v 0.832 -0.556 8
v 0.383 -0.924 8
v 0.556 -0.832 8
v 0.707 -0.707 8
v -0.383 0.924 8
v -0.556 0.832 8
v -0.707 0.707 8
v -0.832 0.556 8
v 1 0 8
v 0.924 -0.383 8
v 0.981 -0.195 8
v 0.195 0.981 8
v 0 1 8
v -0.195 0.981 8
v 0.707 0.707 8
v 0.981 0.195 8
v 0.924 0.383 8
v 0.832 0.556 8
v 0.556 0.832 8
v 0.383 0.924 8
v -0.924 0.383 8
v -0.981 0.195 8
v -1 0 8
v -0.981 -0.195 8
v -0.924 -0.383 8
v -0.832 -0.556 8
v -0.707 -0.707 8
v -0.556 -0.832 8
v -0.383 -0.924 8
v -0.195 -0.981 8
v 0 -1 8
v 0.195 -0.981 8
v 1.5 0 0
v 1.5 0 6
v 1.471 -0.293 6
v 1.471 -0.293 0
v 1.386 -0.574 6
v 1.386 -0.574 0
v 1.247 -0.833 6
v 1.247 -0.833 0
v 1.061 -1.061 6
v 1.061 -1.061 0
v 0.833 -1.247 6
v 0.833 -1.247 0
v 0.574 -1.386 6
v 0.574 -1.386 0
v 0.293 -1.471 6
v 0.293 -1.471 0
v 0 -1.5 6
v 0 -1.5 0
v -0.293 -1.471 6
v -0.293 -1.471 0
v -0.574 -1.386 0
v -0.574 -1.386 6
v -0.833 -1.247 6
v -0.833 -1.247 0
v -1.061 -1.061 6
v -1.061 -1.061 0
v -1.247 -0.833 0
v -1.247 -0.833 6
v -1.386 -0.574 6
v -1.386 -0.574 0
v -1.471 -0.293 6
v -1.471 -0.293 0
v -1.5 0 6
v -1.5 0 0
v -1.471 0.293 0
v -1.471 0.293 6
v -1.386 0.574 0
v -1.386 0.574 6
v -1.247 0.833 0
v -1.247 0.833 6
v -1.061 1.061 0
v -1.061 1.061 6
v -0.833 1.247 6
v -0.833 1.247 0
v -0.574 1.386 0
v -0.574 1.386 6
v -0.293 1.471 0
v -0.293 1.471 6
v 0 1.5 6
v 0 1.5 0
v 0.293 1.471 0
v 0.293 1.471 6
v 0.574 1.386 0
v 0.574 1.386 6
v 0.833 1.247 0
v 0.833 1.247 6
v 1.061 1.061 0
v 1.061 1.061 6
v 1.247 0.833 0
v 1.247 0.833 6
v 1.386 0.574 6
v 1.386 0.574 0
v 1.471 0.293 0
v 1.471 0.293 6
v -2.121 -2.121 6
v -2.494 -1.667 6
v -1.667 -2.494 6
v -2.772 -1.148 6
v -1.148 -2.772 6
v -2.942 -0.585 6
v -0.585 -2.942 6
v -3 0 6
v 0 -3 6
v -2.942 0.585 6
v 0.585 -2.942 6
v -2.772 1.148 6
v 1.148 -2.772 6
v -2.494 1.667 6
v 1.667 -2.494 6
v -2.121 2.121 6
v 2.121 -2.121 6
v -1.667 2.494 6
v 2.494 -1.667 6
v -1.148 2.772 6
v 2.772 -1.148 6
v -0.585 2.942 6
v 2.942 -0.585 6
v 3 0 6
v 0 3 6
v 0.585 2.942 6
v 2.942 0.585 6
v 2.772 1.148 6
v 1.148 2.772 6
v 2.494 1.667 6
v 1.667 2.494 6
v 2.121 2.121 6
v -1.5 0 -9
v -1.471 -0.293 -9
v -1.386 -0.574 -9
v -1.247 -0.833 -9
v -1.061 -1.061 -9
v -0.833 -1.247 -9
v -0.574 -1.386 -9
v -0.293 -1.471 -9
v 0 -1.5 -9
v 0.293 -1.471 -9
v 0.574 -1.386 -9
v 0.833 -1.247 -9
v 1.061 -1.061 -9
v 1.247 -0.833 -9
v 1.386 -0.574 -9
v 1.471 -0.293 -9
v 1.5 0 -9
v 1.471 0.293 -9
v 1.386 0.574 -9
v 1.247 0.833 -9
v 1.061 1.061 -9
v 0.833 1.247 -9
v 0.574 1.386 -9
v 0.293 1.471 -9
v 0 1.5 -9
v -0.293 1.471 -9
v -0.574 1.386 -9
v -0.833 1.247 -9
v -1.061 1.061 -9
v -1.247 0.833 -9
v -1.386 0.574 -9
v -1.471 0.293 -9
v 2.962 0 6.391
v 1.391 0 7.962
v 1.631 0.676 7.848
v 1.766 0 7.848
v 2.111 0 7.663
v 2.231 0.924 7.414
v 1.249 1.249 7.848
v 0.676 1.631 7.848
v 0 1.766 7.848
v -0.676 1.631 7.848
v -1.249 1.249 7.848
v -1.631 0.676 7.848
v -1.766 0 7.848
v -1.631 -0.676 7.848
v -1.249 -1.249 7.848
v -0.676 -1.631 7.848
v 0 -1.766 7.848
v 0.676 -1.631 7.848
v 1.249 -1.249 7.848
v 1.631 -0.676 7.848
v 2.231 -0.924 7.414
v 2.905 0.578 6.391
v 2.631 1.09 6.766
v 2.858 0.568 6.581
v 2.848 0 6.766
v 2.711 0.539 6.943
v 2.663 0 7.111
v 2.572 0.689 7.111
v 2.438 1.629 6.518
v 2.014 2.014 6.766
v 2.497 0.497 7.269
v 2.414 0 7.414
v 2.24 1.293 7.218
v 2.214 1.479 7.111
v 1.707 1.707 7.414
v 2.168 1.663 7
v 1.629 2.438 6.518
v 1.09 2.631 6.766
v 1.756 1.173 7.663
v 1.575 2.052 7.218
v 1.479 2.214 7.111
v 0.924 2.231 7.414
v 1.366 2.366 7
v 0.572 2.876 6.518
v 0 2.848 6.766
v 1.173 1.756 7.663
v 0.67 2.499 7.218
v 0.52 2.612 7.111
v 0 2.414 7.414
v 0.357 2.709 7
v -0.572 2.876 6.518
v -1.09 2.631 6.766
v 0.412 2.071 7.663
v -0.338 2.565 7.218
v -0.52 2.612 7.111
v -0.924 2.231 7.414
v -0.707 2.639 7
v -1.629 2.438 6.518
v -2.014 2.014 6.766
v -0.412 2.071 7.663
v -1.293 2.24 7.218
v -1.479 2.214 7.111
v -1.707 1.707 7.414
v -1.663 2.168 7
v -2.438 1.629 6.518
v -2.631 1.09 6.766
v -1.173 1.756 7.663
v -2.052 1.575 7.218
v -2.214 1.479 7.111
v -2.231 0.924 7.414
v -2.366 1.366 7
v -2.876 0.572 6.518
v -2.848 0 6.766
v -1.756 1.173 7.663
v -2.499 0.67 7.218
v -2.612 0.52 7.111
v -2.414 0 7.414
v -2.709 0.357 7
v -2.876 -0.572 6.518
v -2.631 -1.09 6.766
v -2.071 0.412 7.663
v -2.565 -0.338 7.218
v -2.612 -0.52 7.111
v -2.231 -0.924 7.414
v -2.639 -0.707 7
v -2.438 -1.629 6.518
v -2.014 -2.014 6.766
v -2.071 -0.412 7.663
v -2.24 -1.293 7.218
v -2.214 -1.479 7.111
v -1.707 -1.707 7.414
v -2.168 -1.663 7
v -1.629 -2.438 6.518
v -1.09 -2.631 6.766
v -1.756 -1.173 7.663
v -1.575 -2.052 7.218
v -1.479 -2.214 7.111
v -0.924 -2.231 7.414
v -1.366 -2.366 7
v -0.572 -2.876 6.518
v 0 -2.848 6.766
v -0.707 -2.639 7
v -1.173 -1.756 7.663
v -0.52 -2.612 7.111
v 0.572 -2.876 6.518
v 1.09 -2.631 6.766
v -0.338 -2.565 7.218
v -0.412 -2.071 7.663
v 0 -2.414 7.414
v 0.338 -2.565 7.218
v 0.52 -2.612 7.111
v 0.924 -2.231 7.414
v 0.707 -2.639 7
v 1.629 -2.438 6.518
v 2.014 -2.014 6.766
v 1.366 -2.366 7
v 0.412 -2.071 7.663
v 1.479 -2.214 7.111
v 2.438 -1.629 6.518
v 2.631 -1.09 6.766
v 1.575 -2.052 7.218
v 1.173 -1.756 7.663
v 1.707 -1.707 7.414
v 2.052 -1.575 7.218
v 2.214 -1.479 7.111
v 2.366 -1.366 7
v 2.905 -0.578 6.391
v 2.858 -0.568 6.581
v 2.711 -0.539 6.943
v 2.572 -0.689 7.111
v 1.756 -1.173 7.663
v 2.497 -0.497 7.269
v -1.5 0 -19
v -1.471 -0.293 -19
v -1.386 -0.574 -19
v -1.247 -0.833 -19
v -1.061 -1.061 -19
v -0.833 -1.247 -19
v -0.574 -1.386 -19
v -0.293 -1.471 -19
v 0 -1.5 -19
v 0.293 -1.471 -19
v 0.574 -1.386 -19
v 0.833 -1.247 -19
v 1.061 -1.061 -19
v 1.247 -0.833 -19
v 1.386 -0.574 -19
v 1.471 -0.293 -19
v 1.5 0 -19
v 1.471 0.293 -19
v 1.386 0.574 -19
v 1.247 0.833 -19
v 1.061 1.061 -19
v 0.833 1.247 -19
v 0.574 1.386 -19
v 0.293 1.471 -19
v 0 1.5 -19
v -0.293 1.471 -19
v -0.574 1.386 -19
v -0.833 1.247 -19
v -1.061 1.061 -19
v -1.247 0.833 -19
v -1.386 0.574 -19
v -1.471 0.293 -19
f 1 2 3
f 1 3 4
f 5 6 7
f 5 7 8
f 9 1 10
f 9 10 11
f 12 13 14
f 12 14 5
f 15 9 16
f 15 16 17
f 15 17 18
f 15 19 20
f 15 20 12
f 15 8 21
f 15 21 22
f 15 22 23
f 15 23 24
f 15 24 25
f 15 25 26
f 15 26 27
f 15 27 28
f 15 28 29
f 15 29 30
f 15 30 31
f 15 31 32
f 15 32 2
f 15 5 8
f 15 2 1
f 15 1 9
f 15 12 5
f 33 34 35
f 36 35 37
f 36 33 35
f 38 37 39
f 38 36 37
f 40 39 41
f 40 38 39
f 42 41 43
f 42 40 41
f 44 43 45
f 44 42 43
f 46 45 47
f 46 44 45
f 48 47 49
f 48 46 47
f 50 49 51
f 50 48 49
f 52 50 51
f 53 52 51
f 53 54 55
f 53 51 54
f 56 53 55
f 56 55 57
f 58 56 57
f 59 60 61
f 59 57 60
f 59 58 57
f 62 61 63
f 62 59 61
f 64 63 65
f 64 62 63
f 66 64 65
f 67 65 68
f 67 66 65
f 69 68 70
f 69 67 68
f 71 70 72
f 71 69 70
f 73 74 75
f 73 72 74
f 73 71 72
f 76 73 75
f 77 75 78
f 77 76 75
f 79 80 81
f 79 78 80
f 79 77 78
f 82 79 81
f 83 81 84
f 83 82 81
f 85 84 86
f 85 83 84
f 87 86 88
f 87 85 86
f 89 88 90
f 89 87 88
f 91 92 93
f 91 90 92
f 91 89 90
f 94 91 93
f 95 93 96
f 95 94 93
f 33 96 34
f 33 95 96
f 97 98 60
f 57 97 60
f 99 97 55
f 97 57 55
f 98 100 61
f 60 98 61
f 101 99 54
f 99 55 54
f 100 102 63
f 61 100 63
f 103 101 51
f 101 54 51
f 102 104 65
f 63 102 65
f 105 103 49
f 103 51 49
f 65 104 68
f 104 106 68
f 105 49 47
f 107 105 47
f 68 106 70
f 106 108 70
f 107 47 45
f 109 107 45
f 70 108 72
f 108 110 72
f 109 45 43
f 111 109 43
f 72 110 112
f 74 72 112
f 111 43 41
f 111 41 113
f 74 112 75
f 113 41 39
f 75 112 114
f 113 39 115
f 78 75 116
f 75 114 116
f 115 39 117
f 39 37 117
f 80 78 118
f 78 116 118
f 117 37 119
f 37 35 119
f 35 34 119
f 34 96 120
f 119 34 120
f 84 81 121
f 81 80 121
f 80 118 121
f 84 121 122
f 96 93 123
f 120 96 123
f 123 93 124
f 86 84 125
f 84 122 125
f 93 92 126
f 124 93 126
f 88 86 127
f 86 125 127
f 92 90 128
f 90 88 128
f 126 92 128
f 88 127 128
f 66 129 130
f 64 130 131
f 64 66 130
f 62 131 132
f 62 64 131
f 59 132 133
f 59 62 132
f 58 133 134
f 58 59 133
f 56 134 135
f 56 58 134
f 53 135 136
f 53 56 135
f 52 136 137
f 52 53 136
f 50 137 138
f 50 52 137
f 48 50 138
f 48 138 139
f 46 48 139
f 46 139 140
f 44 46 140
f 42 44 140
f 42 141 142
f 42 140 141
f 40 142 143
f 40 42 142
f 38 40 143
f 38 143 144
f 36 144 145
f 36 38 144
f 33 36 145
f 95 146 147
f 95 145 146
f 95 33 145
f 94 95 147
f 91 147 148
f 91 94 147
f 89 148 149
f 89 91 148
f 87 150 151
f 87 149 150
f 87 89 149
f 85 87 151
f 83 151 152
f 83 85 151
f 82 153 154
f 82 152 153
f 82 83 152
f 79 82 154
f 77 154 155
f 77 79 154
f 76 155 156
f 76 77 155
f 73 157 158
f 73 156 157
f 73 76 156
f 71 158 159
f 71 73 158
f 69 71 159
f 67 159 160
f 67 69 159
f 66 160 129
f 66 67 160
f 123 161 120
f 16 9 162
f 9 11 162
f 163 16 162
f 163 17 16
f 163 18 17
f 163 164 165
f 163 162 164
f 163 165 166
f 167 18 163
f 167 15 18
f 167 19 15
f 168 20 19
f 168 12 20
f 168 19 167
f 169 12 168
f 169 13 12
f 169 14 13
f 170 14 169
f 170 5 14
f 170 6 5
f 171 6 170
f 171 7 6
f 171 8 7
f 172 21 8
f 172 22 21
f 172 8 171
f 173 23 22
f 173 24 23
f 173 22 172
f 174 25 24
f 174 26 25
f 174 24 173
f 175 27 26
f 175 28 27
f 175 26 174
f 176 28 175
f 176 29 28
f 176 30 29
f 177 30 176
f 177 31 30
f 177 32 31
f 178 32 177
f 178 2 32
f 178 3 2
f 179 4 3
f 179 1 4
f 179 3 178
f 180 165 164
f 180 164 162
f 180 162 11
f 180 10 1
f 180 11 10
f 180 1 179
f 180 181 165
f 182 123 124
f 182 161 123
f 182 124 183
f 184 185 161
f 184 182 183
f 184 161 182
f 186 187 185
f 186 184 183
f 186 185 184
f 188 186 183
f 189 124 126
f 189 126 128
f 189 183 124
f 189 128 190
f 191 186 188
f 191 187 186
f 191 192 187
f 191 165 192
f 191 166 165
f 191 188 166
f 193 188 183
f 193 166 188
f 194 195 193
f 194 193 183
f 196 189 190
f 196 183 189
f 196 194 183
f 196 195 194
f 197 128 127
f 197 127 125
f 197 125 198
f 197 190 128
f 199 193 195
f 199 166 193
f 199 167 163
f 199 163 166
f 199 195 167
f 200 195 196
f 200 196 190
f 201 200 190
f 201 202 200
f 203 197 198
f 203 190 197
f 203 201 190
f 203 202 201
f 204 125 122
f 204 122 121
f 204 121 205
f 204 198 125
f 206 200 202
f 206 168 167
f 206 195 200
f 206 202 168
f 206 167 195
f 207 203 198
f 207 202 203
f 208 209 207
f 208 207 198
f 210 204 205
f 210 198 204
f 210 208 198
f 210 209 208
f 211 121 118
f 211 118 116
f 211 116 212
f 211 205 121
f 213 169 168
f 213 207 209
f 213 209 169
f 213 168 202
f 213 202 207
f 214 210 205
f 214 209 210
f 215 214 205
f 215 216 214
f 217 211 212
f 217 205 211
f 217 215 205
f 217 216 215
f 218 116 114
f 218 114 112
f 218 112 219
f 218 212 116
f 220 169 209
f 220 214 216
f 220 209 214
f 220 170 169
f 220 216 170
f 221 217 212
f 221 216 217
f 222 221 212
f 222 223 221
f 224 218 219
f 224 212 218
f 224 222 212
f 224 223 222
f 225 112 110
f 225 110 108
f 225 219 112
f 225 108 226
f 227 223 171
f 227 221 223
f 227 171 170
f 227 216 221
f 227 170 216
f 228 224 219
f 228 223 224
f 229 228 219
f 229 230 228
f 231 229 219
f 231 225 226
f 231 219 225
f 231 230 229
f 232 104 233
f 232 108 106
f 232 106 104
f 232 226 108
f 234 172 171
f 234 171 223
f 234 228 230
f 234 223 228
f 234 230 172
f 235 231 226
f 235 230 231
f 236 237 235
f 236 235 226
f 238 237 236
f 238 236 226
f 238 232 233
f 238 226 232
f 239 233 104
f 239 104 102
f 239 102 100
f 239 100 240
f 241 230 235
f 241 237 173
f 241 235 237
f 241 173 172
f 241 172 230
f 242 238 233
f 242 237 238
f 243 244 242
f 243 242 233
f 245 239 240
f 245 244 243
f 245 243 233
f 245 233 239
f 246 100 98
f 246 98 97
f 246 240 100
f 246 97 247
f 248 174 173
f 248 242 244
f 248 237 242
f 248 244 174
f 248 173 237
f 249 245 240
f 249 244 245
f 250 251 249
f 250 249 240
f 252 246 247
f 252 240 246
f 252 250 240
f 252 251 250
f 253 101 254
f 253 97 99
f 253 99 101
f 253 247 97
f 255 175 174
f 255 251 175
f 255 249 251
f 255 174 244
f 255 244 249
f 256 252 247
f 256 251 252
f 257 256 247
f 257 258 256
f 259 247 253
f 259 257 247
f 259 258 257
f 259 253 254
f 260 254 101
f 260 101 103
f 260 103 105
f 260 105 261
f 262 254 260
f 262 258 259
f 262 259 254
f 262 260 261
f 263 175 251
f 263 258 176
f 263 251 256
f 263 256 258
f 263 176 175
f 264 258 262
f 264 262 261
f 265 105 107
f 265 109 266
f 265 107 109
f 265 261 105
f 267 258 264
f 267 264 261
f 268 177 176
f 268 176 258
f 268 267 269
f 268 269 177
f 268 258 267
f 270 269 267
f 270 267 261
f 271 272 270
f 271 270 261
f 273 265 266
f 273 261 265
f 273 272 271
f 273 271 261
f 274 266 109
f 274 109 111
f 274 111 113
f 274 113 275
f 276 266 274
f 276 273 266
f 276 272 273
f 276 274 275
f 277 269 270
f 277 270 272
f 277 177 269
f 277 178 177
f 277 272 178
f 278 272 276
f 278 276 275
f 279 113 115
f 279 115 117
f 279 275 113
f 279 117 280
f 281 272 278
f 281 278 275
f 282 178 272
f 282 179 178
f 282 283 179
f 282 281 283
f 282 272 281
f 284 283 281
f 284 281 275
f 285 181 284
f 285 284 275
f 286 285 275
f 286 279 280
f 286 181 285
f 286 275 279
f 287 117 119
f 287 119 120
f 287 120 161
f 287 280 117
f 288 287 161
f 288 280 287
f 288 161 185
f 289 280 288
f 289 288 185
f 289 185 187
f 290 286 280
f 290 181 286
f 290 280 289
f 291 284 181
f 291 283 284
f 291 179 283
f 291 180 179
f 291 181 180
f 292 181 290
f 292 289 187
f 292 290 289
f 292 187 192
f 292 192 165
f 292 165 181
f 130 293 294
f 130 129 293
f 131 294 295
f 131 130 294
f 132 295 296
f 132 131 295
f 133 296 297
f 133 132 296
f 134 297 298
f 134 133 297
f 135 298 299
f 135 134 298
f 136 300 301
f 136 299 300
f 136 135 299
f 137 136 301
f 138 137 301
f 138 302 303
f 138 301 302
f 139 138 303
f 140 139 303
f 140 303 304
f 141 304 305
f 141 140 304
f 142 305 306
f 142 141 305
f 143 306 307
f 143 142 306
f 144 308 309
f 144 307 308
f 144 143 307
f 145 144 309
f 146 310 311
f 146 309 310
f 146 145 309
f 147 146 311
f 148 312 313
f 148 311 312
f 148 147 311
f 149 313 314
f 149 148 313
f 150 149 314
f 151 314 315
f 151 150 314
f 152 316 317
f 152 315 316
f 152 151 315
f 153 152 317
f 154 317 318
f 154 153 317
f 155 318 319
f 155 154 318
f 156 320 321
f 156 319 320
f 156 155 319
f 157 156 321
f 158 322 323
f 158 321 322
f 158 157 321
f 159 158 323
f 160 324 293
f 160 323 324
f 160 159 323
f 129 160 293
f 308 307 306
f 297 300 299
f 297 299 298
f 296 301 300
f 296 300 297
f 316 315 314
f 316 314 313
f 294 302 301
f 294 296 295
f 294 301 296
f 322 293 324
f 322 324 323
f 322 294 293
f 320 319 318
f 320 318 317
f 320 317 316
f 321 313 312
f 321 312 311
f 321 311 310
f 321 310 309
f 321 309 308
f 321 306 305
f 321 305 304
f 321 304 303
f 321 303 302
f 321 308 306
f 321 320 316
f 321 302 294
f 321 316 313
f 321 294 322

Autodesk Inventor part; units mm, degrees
ref_plane "YZ Plane" through (0, 0, 0) normal (1, 0, 0) x (0, 1, 0)
ref_plane "XZ Plane" through (0, 0, 0) normal (0, 1, 0) x (-1, 0, 0)
ref_plane "XY Plane" through (0, 0, 0) normal (0, 0, 1) x (1, 0, 0)
sketch "スケッチ1" plane through (0, 0, 0) normal (0, 0, 1) x (1, 0, 0)
  circle A0 centre (0, 0) radius 1.5
  dimension "d0" = 3
extrude "押し出し1" add sketch "スケッチ1" along normal blind 6
sketch "スケッチ2" plane through (0, 0, 6) normal (0, 0, 1) x (1, 0, 0)
  circle A0 centre (0, 0) radius 1.5 projected
  circle A1 centre (0, 0) radius 3
  dimension "d3" = 6
extrude "押し出し2" add sketch "スケッチ2" along normal blind 2 contours A0 | A1
fillet "フィレット1" radius 2 1 edges at (-3, 0, 8)
thread "ねじ1" size "M3x0.5" class "6g" standard "ANSI Metric M Profile" full length
sketch "スケッチ3" plane through (0, 0, 0) normal (0, 0, -1) x (-1, 0, 0)
  circle A0 centre (0, 0) radius 1.5 projected
extrude "押し出し3" add sketch "スケッチ3" along normal blind 9
sketch "スケッチ4" plane through (0, 0, -9) normal (0, 0, -1) x (-1, 0, 0)
  circle A0 centre (0, 0) radius 1.5 projected
extrude "押し出し4" add sketch "スケッチ4" along normal blind 10
properties part number "SB　25mmなべネジ" material "Steel, Mild"
